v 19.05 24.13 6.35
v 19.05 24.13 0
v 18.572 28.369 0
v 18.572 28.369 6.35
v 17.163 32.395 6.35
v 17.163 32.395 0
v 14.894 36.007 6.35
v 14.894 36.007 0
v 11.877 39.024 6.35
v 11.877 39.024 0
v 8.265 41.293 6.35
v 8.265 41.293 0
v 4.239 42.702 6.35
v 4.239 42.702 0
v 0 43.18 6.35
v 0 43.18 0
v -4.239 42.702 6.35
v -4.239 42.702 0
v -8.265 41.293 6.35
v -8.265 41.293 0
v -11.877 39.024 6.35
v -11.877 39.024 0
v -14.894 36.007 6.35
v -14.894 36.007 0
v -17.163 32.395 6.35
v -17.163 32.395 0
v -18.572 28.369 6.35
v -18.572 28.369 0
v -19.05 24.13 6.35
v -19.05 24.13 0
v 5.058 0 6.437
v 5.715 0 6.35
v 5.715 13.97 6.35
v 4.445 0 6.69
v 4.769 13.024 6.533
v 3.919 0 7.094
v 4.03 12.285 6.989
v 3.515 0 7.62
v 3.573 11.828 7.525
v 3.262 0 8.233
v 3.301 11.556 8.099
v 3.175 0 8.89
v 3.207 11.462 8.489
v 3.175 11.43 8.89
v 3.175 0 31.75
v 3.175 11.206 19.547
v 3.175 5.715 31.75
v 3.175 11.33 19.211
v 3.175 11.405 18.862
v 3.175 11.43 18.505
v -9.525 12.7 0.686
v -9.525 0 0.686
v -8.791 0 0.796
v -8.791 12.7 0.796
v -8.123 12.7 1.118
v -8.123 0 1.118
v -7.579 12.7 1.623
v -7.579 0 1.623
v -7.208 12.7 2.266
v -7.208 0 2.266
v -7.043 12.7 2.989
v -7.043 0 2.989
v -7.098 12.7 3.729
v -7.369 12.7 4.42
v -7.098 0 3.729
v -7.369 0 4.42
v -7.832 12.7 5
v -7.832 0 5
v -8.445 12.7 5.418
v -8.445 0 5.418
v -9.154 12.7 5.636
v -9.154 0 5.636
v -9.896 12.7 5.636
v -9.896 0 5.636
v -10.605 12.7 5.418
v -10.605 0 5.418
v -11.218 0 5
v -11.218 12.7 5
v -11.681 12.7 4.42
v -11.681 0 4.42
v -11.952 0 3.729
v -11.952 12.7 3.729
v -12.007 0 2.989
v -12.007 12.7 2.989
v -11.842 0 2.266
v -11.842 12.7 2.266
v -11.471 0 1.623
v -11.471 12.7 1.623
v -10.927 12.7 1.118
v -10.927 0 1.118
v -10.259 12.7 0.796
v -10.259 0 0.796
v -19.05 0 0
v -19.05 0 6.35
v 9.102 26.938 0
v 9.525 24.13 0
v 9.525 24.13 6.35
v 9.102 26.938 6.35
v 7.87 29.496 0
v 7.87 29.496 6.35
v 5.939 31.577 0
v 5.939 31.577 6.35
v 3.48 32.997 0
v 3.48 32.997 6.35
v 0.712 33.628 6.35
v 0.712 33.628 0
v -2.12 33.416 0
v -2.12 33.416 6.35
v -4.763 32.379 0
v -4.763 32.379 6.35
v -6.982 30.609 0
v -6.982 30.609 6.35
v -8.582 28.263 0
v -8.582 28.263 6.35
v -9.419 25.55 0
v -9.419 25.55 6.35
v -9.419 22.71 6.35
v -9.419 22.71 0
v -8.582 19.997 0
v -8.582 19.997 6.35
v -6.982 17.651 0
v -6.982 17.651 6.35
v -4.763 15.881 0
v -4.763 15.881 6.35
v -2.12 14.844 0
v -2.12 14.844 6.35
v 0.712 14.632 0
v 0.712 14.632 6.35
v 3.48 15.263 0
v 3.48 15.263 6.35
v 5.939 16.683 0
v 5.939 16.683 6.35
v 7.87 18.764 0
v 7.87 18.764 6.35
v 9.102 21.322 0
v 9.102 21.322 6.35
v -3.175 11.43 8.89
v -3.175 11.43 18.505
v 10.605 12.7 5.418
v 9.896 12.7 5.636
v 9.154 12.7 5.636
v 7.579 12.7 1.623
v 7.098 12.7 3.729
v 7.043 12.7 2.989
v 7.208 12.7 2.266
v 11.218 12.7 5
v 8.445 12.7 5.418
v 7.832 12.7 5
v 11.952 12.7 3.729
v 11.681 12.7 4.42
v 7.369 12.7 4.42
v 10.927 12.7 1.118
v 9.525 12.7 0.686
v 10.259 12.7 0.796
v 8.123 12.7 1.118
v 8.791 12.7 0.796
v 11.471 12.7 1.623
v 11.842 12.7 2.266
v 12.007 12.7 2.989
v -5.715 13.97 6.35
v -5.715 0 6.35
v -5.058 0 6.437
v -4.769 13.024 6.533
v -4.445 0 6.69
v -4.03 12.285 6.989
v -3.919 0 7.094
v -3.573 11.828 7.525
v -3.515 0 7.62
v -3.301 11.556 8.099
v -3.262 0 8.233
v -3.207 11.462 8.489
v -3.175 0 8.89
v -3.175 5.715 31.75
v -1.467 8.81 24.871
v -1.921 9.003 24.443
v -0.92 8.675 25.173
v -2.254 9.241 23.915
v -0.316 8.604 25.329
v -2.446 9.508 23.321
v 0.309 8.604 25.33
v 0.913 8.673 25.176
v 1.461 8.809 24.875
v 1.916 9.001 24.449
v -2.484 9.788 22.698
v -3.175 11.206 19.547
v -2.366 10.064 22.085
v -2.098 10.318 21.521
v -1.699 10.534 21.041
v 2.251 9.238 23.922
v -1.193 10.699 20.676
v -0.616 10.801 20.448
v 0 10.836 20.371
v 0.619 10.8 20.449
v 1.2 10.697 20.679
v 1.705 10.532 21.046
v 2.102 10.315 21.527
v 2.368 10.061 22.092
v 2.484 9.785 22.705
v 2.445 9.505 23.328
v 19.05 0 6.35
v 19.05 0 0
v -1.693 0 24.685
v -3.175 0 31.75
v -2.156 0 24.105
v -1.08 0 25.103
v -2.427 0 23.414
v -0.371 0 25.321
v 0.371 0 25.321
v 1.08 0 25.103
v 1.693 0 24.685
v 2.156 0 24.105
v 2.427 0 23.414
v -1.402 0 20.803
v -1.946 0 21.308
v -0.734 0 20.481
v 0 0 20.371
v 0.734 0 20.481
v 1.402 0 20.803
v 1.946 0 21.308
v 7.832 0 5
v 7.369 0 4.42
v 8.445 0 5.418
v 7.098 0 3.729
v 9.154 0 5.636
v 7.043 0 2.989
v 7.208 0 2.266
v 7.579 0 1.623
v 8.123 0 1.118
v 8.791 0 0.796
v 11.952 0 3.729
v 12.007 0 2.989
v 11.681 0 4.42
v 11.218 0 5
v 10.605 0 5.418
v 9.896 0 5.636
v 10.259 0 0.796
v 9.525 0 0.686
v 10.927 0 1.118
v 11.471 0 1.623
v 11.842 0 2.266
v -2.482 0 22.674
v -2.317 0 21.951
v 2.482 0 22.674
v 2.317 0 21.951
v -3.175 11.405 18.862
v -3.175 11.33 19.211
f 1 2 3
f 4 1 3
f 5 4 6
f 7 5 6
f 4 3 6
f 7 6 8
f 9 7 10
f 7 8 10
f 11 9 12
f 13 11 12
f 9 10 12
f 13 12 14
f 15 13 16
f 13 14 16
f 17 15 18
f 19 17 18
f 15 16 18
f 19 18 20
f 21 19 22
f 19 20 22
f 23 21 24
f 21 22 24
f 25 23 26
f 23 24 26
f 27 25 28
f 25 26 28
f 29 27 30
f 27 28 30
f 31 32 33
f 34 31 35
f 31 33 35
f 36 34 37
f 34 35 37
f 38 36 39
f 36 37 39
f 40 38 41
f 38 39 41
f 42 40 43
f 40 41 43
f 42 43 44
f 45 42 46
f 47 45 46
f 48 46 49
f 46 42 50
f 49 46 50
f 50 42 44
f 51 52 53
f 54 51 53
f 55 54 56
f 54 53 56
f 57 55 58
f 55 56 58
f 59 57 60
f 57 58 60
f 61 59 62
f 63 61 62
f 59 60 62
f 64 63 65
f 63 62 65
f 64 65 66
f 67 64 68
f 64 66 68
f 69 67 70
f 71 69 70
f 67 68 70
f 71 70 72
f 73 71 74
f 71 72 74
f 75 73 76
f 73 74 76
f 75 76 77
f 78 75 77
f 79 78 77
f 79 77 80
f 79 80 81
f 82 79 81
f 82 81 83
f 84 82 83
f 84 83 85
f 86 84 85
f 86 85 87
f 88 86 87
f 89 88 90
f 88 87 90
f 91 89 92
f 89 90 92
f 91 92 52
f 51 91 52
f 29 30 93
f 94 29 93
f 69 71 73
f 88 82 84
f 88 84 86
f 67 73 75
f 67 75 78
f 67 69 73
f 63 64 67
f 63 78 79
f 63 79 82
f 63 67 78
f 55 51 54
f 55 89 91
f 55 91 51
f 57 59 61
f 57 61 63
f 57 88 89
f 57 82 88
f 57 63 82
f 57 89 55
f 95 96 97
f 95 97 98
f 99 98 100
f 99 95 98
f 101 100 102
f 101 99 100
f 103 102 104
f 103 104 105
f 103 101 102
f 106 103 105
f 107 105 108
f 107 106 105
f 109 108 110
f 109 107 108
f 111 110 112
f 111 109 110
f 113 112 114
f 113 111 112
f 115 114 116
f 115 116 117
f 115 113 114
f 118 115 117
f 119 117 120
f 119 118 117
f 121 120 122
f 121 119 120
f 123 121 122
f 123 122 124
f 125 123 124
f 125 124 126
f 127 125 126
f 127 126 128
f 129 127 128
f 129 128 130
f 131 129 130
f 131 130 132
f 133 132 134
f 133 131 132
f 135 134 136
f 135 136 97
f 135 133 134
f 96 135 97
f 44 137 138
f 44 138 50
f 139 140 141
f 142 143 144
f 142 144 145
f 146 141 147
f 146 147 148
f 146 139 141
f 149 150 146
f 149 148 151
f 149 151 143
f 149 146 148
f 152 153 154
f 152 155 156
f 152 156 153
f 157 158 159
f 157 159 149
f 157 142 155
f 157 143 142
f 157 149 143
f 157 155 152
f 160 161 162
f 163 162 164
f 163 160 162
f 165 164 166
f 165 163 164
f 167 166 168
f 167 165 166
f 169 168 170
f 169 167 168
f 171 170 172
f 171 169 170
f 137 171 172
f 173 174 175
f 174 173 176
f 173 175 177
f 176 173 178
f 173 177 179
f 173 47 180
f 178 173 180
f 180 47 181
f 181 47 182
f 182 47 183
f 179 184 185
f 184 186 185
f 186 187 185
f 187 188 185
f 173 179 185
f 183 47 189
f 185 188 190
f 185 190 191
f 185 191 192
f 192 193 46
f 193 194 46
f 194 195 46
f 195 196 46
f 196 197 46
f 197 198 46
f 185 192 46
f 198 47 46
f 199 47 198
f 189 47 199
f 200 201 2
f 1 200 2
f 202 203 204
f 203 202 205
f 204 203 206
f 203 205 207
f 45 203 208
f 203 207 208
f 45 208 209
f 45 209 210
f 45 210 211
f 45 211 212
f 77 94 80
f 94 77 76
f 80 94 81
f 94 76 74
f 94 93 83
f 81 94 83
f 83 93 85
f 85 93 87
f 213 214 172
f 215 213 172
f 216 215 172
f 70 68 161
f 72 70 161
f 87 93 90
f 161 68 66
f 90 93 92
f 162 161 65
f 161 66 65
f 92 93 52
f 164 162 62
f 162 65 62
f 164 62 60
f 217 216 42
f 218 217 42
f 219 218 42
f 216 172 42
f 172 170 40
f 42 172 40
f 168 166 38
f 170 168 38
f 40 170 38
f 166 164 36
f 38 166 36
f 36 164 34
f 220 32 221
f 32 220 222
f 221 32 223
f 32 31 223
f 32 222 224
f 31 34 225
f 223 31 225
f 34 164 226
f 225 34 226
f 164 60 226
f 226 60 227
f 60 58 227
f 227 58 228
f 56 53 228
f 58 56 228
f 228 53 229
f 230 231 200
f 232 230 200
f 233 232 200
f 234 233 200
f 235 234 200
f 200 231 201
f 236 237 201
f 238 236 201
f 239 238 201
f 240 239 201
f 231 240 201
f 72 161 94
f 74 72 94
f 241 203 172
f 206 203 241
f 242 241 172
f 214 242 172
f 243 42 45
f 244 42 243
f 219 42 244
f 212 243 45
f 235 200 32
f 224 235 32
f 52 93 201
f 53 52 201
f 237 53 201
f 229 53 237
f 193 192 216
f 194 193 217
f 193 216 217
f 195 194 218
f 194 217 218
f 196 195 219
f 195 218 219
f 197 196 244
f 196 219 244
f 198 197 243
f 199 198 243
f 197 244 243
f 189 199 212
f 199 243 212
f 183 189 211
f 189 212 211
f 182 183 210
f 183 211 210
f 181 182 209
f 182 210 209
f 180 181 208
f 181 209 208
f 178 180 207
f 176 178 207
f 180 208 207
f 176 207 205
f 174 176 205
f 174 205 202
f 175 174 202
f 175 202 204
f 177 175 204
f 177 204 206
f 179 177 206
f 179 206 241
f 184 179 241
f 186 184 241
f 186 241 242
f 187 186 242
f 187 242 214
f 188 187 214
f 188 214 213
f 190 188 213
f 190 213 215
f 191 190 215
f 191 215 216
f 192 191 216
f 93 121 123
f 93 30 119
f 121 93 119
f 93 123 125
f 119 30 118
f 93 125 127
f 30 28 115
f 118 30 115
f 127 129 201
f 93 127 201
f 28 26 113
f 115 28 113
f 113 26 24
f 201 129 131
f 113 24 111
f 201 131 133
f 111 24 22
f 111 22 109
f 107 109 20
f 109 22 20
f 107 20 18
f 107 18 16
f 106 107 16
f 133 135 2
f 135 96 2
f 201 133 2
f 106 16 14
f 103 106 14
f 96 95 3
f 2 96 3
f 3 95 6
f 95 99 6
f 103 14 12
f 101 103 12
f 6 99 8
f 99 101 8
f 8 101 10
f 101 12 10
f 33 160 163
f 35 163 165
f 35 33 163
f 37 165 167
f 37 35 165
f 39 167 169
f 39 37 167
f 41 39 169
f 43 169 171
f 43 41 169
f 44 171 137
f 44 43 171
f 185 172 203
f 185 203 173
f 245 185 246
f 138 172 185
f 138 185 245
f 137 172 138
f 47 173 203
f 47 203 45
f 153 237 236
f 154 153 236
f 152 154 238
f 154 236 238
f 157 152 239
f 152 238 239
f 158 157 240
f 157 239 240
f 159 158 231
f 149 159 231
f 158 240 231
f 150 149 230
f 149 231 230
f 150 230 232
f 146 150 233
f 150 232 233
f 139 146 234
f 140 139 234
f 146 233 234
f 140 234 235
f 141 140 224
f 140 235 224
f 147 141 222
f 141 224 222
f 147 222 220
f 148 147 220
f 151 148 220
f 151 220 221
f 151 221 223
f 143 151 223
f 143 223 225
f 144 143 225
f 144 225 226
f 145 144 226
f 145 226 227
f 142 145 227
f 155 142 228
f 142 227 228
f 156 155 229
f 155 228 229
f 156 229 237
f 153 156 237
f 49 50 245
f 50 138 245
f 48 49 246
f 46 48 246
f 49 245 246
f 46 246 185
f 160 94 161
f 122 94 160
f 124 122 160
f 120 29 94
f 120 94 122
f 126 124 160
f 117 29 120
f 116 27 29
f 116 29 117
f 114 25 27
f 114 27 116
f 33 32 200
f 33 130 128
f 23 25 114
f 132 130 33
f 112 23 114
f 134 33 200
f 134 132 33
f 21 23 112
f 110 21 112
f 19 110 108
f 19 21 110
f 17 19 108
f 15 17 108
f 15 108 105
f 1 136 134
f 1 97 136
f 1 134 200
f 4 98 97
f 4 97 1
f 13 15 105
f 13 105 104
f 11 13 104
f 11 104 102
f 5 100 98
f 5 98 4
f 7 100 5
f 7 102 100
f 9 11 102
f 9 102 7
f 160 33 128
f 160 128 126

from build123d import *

# Parameters (mm, degrees)
SKETCH1_R           = 9.525
BOSS_EXTRUDE1_DEPTH = 6.35
SKETCH2_W           = 6.35
SKETCH2_H           = 11.43
BOSS_EXTRUDE2_DEPTH = 25.4
CUT_EXTRUDE1_DEPTH  = 25.4
SKETCH4_R           = 2.4892
CUT_EXTRUDE2_DEPTH  = 12.7
FILLET1_R           = 2.54


with BuildPart() as part:
    # Sketch1 → Boss-Extrude1 (new body)
    with BuildSketch(Plane.XY):
        with BuildLine():
            Line((19.05, 0), (19.05, 24.13))
            ThreePointArc((19.05, 24.13), (0, 43.18), (-19.05, 24.13))
            Line((-19.05, 24.13), (-19.05, 0))
            Line((-19.05, 0), (19.05, 0))
        make_face()
        with Locations((0, 24.13)):
            Circle(SKETCH1_R, mode=Mode.SUBTRACT)
    extrude(amount=BOSS_EXTRUDE1_DEPTH)

    # Sketch2 → Boss-Extrude2 (add)
    with BuildSketch(Plane.XY.offset(6.35)):
        with Locations((0, 5.715)):
            Rectangle(SKETCH2_W, SKETCH2_H)
    extrude(amount=BOSS_EXTRUDE2_DEPTH)

    # Sketch3 → Cut-Extrude1 (cut)
    with BuildSketch(Plane(origin=(3.175, 0, 0), x_dir=(0, 0, -1), z_dir=(1, 0, 0))):
        Polygon((-31.75, 5.715), (-19.05, 11.43), (-31.75, 11.43), align=None)
    extrude(amount=-CUT_EXTRUDE1_DEPTH, mode=Mode.SUBTRACT)

    # Sketch4 → Cut-Extrude2 (cut)
    with BuildSketch(Plane.XZ):
        with Locations(Location((-9.525, 3.175, 0), (0, 0, 270))):
            Circle(SKETCH4_R)
        with Locations(Location((9.525, 3.175, 0), (0, 0, 270))):
            Circle(SKETCH4_R)
        with Locations(Location((0, 22.86, 0), (0, 0, 270))):
            Circle(SKETCH4_R)
    extrude(amount=-CUT_EXTRUDE2_DEPTH, mode=Mode.SUBTRACT)

    # Fillet1
    fillet1_edges = [part.edges().sort_by_distance(p)[0] for p in [
        (0, 11.43, 19.05),
        (3.175, 5.715, 6.35),
        (0, 11.43, 6.35),
        (-3.175, 5.715, 6.35),
    ]]
    fillet(fillet1_edges, radius=FILLET1_R)


solid = part.part
